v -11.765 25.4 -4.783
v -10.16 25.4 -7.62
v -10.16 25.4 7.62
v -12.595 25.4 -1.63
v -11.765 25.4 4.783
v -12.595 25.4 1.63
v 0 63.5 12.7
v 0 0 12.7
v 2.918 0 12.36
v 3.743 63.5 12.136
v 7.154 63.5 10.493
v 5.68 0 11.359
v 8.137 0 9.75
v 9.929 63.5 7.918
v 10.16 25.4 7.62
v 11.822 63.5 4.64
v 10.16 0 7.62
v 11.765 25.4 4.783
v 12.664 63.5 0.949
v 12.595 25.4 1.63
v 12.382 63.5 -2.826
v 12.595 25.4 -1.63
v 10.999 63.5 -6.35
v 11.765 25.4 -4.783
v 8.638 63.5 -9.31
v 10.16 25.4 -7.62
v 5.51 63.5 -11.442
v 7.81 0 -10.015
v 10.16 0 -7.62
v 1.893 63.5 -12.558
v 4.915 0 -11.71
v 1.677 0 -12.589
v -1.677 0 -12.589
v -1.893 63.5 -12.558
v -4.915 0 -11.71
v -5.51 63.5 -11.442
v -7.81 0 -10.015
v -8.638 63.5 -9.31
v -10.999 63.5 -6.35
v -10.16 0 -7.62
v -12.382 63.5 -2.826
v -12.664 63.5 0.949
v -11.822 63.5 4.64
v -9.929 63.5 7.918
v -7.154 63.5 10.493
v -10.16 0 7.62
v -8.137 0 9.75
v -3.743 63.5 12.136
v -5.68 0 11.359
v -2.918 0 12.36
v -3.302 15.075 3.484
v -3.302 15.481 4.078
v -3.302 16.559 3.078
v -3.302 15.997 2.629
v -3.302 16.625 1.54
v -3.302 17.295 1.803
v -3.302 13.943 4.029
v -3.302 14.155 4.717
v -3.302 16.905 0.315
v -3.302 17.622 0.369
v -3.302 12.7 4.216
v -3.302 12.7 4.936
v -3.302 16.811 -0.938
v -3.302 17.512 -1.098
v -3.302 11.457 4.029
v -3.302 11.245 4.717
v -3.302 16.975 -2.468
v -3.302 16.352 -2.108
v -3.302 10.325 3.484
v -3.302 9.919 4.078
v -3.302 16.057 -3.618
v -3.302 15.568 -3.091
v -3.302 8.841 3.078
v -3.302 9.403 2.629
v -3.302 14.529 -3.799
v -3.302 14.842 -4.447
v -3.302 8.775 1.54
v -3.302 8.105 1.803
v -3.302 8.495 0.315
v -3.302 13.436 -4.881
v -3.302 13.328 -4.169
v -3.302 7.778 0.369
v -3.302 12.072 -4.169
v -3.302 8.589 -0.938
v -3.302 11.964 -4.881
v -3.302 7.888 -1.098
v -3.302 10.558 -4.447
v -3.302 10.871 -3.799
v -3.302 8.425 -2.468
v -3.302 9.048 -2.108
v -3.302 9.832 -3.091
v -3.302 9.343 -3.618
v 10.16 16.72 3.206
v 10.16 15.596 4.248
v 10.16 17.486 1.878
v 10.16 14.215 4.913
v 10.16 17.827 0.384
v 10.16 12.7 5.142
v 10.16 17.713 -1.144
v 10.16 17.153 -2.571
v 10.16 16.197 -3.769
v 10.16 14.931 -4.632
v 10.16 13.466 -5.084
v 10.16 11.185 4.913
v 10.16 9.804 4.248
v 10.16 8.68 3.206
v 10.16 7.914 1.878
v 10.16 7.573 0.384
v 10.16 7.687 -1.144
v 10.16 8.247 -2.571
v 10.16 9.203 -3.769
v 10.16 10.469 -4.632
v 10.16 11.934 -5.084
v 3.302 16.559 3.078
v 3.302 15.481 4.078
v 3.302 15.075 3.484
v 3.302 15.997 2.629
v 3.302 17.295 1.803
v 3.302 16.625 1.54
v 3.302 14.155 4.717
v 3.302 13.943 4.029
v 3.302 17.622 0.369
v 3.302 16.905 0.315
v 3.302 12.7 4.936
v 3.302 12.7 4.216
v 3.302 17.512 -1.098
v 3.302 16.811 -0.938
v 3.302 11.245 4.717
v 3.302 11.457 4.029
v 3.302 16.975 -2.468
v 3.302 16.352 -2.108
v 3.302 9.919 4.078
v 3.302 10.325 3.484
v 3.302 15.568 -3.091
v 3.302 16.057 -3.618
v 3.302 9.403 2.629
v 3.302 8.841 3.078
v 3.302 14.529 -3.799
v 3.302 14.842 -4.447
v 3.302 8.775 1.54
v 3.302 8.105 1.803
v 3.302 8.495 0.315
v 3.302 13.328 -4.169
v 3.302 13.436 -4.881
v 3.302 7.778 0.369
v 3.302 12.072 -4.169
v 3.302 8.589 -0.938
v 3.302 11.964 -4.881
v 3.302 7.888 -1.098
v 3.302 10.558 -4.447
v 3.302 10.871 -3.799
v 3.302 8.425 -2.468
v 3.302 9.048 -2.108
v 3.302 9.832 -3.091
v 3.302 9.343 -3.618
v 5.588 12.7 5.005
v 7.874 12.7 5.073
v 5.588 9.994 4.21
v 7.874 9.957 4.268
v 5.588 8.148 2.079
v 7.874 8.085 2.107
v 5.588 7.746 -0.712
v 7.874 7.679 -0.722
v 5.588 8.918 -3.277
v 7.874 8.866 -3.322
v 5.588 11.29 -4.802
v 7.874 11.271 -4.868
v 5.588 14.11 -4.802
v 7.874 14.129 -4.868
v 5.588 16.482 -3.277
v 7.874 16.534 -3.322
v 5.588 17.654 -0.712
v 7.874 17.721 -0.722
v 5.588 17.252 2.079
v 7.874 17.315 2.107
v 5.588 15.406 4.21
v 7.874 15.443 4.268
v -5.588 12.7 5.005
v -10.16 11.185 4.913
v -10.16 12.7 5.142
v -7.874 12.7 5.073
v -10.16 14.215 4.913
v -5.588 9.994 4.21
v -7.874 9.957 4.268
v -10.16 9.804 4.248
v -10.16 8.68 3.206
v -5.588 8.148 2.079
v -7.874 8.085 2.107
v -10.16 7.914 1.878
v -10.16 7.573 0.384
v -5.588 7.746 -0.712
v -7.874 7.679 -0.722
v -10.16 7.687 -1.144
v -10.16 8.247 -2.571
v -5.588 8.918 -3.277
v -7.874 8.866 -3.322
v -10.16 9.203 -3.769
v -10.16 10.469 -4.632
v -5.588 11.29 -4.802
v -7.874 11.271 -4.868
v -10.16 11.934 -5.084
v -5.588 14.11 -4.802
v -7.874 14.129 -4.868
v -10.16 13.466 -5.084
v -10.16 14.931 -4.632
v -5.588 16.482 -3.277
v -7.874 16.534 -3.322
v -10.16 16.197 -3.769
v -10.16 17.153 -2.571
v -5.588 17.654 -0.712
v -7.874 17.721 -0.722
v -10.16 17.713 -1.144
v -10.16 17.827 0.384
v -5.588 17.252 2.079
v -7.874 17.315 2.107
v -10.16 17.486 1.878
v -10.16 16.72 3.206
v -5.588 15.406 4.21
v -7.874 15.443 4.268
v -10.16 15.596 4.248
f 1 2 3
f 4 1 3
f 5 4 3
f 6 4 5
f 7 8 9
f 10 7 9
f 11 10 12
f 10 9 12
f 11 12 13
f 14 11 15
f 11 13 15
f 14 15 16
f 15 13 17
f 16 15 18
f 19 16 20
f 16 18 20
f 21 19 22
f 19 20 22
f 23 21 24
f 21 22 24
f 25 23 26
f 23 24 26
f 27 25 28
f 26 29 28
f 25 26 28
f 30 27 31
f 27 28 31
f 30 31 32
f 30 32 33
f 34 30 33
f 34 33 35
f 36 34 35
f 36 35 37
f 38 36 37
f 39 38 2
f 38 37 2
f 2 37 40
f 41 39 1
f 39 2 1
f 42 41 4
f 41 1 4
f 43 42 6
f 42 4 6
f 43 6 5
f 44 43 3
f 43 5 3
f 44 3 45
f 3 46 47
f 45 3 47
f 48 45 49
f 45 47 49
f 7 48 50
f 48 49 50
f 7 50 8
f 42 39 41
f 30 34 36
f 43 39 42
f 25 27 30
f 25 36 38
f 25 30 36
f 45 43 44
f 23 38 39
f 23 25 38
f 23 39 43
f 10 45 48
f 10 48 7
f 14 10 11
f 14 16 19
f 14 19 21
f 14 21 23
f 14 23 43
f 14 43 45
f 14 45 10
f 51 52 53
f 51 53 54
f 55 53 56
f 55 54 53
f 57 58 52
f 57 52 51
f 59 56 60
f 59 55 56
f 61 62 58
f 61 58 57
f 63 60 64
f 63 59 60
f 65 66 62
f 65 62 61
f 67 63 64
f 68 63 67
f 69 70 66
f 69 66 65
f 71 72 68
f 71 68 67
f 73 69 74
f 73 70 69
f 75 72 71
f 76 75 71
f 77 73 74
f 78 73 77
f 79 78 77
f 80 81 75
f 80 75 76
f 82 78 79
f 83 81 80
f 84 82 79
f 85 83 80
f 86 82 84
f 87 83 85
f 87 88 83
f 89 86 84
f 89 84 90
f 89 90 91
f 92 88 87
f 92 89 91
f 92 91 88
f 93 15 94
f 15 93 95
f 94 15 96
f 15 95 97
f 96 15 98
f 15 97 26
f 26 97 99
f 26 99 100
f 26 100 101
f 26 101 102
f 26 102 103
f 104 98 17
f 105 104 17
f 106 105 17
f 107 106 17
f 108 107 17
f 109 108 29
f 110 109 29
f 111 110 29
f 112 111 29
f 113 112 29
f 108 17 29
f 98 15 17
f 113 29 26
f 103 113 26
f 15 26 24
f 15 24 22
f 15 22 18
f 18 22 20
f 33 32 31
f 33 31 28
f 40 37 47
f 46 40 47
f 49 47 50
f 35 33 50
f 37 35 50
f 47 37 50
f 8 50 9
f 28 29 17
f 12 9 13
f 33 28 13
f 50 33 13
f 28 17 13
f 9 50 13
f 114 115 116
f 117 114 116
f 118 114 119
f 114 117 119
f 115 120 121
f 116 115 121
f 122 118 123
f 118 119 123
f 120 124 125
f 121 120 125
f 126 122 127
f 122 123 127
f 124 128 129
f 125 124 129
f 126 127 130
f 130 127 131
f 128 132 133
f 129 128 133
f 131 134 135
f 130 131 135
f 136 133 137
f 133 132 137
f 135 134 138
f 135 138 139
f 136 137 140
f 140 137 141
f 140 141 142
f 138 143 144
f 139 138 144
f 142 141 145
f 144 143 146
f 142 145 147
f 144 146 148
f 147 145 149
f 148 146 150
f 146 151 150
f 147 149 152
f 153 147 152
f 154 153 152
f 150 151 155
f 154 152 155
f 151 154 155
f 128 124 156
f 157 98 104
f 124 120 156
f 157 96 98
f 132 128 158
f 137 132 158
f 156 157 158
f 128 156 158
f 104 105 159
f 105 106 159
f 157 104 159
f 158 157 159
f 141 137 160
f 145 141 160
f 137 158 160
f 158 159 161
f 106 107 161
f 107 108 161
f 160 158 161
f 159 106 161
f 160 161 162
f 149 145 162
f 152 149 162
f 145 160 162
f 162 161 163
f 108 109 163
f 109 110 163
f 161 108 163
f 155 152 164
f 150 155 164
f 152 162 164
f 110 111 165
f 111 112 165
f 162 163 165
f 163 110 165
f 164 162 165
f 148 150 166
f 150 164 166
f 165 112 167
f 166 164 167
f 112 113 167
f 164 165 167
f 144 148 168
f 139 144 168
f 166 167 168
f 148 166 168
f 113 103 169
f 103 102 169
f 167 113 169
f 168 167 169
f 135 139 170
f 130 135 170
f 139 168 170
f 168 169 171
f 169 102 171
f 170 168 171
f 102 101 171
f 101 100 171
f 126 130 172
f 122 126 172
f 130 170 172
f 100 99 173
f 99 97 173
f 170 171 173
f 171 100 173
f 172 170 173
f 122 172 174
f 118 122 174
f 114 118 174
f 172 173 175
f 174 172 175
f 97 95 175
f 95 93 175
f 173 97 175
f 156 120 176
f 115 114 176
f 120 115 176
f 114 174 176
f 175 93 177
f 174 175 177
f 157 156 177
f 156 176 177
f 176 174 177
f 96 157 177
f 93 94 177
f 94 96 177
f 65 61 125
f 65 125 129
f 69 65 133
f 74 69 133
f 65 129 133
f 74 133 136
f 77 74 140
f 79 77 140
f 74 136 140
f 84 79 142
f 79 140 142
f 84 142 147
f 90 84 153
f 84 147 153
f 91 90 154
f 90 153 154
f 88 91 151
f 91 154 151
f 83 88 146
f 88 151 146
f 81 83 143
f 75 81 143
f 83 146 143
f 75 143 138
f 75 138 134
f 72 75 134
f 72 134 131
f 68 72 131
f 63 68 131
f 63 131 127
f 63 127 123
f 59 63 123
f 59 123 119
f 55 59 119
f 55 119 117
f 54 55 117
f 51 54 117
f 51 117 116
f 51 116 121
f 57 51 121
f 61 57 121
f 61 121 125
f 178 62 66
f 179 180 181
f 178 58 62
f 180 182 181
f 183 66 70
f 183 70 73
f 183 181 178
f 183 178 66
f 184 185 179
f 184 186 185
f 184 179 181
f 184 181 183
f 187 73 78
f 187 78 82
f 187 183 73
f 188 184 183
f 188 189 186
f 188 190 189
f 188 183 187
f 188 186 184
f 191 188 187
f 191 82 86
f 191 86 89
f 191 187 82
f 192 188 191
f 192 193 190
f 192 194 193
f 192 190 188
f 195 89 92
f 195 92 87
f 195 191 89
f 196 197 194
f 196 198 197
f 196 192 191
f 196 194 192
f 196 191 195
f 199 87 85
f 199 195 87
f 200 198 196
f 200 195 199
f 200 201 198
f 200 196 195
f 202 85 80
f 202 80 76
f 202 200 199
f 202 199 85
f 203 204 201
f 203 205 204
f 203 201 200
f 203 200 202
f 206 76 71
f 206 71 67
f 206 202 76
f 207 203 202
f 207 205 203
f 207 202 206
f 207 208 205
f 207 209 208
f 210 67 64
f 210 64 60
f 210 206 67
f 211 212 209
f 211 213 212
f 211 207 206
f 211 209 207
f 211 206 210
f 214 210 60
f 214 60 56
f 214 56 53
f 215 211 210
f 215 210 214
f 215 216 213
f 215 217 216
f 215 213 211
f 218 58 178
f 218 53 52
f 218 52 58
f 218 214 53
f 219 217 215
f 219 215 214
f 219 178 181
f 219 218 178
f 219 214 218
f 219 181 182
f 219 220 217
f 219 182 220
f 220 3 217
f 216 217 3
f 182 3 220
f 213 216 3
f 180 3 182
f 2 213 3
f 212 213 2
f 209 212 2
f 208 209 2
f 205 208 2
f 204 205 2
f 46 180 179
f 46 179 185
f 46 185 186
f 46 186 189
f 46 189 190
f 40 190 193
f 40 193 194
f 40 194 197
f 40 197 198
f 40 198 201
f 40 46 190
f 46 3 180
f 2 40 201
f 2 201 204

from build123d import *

# Parameters (mm, degrees)
SKETCH1_R           = 12.7
BOSS_EXTRUDE1_DEPTH = 63.5
CUT_EXTRUDE1_DEPTH  = 25.4


with BuildPart() as part:
    # Sketch1 → Boss-Extrude1 (new body)
    with BuildSketch(Plane(origin=(0, 0, 0), x_dir=(1, 0, 0), z_dir=(0, 1, 0))):
        with Locations(Location((0, 0, 0), (0, 0, 270))):
            Circle(SKETCH1_R)
    extrude(amount=BOSS_EXTRUDE1_DEPTH)

    # Sketch2 → Cut-Extrude1 (cut)
    with BuildSketch(Plane.XZ):
        with BuildLine():
            Line((-10.16, 7.62), (-10.16, -7.62))
            ThreePointArc((-10.16, -7.62), (-12.7, 0), (-10.16, 7.62))
        make_face()
        with BuildLine():
            Line((10.16, 7.62), (10.16, -7.62))
            ThreePointArc((10.16, -7.62), (12.7, 0), (10.16, 7.62))
        make_face()
    extrude(amount=-CUT_EXTRUDE1_DEPTH, mode=Mode.SUBTRACT)

    # Sketch4 → 1/8 NPT Tapped Hole1 (revolve, cut)
    with BuildSketch(Plane(origin=(-10.16, 12.7, 0), x_dir=(0, 0, 1), z_dir=(0, 1, 0))):
        Polygon((0, 0), (0, 14.217468714), (4.2164, 11.684), (4.2164, 6.858), (4.936181096, 6.858), (5.1415188, 0), align=None)
    f_1_8_npt_tapped_hole1 = revolve(axis=Axis((-16.51, 12.7, 0), (1, 0, 0)), mode=Mode.SUBTRACT)

    # Mirror1: 1/8 NPT Tapped Hole1 across plane
    add(f_1_8_npt_tapped_hole1.mirror(Plane(origin=(0, 0, 0), x_dir=(0, 0, 1), z_dir=(1, 0, 0))), mode=Mode.SUBTRACT)


solid = part.part
